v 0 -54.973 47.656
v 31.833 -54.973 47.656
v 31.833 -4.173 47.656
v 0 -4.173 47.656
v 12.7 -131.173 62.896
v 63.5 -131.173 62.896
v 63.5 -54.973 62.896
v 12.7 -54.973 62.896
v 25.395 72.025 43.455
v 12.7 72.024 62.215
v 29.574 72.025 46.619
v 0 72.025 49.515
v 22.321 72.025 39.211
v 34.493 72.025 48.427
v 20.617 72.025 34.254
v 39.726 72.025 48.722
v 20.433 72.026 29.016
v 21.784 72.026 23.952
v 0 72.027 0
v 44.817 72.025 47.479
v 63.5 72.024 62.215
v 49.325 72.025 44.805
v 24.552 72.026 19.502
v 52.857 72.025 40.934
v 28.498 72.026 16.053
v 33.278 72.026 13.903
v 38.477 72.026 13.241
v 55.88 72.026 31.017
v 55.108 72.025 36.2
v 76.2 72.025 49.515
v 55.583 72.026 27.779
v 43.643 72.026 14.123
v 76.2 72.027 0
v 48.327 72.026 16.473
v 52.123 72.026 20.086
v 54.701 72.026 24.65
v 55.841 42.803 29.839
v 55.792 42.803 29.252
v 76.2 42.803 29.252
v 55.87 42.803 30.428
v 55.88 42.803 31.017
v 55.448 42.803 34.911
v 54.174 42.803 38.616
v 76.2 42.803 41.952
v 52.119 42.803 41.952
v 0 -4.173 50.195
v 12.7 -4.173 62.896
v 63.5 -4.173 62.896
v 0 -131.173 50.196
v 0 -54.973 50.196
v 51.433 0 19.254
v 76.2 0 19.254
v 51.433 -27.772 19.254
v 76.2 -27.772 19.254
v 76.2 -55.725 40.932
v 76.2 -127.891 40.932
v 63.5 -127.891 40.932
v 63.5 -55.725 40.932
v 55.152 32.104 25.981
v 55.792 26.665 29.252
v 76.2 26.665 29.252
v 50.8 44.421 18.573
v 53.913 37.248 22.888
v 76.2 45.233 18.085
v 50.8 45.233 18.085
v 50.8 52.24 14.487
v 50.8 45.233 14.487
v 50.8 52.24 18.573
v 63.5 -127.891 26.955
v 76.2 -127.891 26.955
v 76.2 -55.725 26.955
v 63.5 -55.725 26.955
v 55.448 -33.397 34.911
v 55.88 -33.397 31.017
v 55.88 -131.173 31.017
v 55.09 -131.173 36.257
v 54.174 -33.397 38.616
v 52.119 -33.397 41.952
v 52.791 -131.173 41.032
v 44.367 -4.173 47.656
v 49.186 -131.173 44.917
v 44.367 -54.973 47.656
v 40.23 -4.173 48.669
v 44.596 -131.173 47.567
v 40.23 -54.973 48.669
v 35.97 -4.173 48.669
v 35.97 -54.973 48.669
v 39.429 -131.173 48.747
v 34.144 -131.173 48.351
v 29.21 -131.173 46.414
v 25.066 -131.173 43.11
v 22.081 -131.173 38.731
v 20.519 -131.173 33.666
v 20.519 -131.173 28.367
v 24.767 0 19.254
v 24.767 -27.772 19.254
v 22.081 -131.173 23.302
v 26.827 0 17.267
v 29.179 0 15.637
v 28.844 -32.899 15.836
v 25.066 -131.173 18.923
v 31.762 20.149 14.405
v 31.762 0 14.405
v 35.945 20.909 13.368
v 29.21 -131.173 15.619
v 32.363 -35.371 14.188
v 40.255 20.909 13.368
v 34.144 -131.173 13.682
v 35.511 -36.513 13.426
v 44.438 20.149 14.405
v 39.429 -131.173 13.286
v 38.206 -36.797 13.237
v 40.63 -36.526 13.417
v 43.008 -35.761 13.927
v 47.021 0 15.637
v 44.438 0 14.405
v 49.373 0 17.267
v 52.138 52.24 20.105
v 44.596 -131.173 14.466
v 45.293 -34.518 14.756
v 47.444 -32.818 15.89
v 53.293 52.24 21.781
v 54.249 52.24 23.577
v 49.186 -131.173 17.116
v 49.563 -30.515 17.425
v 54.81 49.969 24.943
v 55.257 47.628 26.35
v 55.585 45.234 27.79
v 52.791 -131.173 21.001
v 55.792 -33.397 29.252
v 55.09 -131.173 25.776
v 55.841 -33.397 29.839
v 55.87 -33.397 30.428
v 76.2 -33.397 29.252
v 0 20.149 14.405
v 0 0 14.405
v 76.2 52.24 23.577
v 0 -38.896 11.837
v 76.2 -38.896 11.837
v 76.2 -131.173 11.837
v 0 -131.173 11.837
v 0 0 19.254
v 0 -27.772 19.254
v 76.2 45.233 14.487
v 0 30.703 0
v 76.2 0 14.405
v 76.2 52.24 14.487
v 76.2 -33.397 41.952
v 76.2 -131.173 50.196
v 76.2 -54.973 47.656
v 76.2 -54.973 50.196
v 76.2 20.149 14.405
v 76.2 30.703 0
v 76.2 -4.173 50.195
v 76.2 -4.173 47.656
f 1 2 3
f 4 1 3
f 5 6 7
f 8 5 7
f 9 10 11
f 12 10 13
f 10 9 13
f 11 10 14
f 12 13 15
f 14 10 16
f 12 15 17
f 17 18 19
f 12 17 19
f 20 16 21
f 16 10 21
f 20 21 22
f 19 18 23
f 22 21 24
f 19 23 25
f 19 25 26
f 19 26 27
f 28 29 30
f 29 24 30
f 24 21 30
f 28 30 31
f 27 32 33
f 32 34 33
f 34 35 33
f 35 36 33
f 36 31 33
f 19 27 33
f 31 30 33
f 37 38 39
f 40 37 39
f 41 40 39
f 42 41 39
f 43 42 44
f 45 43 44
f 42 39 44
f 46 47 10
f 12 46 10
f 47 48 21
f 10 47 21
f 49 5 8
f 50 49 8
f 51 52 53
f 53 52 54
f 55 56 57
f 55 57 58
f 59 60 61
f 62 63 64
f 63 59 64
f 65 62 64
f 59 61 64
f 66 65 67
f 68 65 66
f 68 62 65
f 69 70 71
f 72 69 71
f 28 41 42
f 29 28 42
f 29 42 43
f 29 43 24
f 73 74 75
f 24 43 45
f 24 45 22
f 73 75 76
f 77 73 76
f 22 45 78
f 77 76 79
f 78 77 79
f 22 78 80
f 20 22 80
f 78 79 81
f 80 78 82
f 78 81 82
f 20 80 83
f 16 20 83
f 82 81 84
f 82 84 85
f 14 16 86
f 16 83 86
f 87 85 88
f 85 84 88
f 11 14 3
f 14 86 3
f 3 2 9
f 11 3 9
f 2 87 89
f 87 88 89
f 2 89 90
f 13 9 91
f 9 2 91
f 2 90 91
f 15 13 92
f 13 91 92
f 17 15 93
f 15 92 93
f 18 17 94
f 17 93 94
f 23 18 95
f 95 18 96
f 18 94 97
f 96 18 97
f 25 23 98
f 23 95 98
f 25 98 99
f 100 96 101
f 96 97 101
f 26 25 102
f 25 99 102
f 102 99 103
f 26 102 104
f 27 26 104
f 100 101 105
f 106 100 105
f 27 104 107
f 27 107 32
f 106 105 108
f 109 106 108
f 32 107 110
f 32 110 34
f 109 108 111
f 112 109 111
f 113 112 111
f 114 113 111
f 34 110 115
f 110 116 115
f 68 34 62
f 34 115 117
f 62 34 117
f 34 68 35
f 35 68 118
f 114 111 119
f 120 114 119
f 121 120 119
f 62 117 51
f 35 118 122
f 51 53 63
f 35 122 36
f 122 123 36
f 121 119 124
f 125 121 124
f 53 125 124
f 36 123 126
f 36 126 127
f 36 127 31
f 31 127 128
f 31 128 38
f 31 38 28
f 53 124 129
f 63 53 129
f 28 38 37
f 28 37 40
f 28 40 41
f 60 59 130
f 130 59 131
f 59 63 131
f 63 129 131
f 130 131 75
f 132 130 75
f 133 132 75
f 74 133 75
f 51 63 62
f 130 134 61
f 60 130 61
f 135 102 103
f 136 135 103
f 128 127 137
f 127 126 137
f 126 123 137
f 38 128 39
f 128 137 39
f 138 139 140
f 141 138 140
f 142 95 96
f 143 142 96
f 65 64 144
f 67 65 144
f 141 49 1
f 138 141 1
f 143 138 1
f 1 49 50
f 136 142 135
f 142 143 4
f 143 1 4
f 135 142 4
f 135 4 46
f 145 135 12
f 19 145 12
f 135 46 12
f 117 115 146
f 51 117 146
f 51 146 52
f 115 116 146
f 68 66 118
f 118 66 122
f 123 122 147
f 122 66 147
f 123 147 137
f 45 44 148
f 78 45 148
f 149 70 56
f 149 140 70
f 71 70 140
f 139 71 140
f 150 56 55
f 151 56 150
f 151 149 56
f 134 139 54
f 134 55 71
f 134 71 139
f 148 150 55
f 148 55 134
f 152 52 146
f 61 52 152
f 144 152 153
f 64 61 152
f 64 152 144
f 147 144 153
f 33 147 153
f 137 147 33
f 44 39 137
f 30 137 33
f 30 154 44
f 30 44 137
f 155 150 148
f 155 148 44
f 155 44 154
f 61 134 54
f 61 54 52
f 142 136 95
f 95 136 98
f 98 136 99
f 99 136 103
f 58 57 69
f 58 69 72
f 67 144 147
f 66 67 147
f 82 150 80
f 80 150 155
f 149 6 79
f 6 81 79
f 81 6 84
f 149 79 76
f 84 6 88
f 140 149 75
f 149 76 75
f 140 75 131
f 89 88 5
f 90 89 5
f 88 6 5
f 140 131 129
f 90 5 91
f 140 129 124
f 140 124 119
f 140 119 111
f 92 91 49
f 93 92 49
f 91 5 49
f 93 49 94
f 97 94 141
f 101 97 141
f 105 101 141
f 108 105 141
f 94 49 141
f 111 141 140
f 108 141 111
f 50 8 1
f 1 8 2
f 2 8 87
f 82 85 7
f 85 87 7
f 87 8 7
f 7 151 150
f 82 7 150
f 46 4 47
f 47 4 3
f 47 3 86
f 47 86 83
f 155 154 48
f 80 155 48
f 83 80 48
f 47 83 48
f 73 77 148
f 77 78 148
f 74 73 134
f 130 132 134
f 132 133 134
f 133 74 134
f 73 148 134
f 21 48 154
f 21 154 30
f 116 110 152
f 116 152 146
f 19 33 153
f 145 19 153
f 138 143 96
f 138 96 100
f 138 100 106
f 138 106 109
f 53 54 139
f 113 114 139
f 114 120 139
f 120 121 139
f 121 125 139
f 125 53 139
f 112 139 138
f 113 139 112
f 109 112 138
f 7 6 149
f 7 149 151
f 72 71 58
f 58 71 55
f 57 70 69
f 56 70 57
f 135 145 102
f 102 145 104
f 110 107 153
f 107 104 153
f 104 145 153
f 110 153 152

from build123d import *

# Parameters (mm, degrees)
F1_DEPTH  = 76.2
F3_DEPTH  = 127
F4_SIZE   = 12.7
F5_R      = 17.78
F5_R_2    = 12.7
F6_DEPTH  = 254
F8_DEPTH  = 25.4
F9_W      = 72.165888
F9_H      = 13.97679
F10_DEPTH = 12.7


with BuildPart() as f1:
    # F0 (on Right) → F1 (new body)
    with BuildSketch(Plane.YZ):
        Polygon((72.027118, 67.494695), (-131.172882, 68.619423), (-131.172882, -34.105305), (72.027118, -34.105305), align=None)
    extrude(amount=F1_DEPTH)

    # F2 (on face) → F3 (cut)
    with BuildSketch(Plane.YZ.offset(76.2)):
        Polygon((-38.896065, 11.837486), (-131.172882, 11.837486), (-131.172882, -34.105305), (72.027118, -34.105305), (72.027118, 0), (30.702649, 0), (20.148747, 14.404653), (0, 14.404653), (0, 19.253744), (-27.771682, 19.253744), align=None)
        Polygon((-131.172882, 68.619423), (-131.172882, 62.895566), (-54.972882, 62.895566), (-54.972882, 47.655566), (-4.172882, 47.655566), (-4.172882, 62.895566), (72.024081, 62.215233), (72.027118, 0), (72.027118, 67.494695), align=None)
    extrude(amount=-F3_DEPTH, mode=Mode.SUBTRACT)

    # F4
    f4_edges = [f1.edges().sort_by_distance(p)[0] for p in [
        (76.2, -93.072882, 62.895566),
        (76.2, 33.925599, 62.5554),
        (0, -93.072882, 62.895566),
        (0, 33.925599, 62.5554),
    ]]
    chamfer(f4_edges, length=F4_SIZE)

    # F5 (on face) → F6 (cut)
    with BuildSketch(Plane.XZ.offset(131.172882)):
        with Locations((38.1, 31.016526)):
            Circle(F5_R)
        with Locations((38.1, 31.016526)):
            Circle(F5_R_2, mode=Mode.SUBTRACT)
        with Locations((38.1, 31.016526)):
            Circle(F5_R_2)
    extrude(amount=-F6_DEPTH, mode=Mode.SUBTRACT)

    # F7 (on face) → F8 (cut)
    with BuildSketch(Plane.YZ.offset(76.2)):
        Polygon((42.803339, 41.952084), (-33.396661, 41.952084), (-33.396661, 29.252084), (26.66526, 29.252084), (45.232709, 18.085102), (45.232709, 14.487018), (52.239504, 14.487018), (52.239504, 23.576912), (42.803339, 29.252084), align=None)
    extrude(amount=-F8_DEPTH, mode=Mode.SUBTRACT)

    # F9 (on face) → F10 (cut)
    with BuildSketch(Plane.YZ.offset(76.2)):
        with Locations((-91.808209, 33.943634)):
            Rectangle(F9_W, F9_H)
    extrude(amount=-F10_DEPTH, mode=Mode.SUBTRACT)


solid = f1.part
